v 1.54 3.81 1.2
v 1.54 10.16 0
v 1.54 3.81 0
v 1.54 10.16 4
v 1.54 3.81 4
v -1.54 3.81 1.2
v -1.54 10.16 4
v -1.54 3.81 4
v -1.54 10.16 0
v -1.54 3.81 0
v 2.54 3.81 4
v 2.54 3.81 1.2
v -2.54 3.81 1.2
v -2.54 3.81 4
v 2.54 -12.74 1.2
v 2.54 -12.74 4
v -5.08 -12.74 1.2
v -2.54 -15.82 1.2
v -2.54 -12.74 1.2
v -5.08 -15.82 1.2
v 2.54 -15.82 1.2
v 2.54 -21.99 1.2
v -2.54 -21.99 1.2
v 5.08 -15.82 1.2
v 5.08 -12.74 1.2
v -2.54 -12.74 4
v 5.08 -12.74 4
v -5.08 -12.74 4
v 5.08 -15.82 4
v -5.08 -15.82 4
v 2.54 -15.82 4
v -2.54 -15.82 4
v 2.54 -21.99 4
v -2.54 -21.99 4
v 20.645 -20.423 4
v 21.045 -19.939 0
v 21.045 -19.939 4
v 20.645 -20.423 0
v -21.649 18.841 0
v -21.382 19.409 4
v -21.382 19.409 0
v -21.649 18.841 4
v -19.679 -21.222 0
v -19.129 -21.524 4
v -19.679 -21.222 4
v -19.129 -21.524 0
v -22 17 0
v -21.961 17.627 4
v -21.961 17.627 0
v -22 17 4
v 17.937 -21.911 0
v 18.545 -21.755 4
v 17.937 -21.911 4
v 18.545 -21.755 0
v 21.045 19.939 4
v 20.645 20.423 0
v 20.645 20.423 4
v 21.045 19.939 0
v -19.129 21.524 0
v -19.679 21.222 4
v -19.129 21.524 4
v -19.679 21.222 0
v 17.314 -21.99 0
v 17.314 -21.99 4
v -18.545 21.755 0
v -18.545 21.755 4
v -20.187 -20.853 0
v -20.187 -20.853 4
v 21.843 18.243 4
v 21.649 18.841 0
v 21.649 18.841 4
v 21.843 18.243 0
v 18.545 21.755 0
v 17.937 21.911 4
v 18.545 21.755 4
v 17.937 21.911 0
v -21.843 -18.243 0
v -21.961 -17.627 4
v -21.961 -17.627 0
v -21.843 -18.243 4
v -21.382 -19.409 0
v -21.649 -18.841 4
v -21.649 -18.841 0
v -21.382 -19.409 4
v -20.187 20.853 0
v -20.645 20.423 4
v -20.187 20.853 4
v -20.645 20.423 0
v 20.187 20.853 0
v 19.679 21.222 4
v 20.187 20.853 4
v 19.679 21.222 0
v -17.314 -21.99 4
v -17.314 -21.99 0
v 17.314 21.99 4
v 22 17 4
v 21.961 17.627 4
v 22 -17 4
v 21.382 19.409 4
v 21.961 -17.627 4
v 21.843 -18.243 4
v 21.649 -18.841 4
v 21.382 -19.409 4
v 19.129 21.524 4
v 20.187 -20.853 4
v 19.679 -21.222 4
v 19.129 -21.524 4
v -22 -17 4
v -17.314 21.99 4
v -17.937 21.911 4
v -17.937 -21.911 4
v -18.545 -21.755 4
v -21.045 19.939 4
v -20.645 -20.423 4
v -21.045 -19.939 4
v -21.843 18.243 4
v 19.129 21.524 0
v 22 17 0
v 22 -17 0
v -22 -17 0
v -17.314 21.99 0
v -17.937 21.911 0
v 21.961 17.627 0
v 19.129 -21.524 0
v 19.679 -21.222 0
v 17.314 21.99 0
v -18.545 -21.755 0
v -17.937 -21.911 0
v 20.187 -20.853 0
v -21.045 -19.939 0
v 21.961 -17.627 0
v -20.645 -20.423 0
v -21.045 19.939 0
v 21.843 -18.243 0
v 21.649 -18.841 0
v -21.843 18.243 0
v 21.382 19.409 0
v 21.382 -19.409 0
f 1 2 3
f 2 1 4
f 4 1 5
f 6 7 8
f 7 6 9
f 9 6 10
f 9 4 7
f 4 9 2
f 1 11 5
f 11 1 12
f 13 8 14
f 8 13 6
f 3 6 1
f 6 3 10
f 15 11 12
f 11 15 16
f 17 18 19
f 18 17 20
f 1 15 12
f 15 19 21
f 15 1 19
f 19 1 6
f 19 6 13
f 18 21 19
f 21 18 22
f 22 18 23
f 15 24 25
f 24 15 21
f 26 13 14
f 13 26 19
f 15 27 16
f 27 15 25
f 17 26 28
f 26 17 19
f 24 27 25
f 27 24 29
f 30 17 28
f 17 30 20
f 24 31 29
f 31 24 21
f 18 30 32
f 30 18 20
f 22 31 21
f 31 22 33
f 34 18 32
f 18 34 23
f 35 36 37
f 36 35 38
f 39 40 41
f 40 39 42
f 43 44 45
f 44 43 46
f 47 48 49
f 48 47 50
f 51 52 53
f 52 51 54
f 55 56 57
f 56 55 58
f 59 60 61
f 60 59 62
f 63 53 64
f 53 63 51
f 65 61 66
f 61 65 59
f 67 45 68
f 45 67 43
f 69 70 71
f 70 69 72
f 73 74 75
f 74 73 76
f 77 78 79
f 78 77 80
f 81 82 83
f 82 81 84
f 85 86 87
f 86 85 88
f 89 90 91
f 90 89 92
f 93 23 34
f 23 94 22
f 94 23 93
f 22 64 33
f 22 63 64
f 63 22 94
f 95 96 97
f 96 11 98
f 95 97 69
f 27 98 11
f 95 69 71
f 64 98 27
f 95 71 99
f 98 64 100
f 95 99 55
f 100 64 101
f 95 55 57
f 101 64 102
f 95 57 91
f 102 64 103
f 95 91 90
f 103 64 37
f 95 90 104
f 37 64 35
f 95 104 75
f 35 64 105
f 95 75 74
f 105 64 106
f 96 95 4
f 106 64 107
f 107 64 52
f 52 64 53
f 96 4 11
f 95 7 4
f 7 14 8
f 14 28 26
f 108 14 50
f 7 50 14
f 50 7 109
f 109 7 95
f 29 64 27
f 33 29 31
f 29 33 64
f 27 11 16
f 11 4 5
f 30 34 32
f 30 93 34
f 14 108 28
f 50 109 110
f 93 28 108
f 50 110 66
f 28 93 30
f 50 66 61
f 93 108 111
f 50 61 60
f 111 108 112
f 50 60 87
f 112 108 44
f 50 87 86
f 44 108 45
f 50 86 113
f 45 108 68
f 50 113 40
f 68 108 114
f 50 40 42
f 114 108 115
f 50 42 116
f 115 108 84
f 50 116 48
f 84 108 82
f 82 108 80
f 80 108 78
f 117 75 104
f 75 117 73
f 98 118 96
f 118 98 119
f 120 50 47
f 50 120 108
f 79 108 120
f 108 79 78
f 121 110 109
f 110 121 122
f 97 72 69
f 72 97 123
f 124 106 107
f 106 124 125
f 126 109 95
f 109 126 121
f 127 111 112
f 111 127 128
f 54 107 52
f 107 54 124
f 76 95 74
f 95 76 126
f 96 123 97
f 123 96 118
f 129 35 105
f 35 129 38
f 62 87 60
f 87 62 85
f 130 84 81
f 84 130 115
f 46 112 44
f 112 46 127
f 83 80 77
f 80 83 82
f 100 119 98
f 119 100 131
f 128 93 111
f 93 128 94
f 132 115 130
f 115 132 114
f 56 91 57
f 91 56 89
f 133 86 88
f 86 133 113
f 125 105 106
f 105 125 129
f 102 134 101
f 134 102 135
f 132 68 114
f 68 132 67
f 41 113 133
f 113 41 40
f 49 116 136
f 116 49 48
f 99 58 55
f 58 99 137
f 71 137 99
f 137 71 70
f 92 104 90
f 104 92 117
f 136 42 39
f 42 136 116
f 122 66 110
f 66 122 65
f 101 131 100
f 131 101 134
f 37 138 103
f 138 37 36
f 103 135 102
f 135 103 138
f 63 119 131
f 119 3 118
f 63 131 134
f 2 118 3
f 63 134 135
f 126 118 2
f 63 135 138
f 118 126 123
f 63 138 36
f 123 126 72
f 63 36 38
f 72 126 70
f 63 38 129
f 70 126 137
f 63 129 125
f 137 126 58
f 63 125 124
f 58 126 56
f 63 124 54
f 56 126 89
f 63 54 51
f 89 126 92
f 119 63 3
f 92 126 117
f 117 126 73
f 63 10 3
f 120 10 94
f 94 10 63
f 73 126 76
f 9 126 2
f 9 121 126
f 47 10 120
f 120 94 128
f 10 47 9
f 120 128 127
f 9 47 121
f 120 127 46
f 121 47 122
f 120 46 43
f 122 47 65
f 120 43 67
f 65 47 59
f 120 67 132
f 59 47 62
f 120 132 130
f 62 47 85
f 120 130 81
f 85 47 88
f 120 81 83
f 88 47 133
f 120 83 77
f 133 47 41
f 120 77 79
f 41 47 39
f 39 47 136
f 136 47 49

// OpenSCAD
$fn = 50;

difference() {
	union() {
		translate(v = [0, 0, 0]) {
			rotate(a = [0, 0, 0]) {
				difference() {
					union() {
						hull() {
							translate(v = [-17.0, 17.0, 0]) {
								cylinder(h = 4, r = 5);
							}
							translate(v = [17.0, 17.0, 0]) {
								cylinder(h = 4, r = 5);
							}
							translate(v = [-17.0, -17.0, 0]) {
								cylinder(h = 4, r = 5);
							}
							translate(v = [17.0, -17.0, 0]) {
								cylinder(h = 4, r = 5);
							}
						}
					}
					union() {
						translate(v = [-1.54, 3.8100000000000005, -1]) {
							cube(size = [3.08, 6.35, 6]);
						}
						translate(v = [-2.54, -12.74, 1.2000000000000002]) {
							cube(size = [5.08, 16.55, 3.8]);
						}
						translate(v = [-5.08, -15.82, 1.2000000000000002]) {
							cube(size = [10.16, 3.08, 3.8]);
						}
						translate(v = [-2.54, -35.82, 1.2000000000000002]) {
							cube(size = [5.08, 20, 3.8]);
						}
					}
				}
			}
		}
	}
	union();
}
